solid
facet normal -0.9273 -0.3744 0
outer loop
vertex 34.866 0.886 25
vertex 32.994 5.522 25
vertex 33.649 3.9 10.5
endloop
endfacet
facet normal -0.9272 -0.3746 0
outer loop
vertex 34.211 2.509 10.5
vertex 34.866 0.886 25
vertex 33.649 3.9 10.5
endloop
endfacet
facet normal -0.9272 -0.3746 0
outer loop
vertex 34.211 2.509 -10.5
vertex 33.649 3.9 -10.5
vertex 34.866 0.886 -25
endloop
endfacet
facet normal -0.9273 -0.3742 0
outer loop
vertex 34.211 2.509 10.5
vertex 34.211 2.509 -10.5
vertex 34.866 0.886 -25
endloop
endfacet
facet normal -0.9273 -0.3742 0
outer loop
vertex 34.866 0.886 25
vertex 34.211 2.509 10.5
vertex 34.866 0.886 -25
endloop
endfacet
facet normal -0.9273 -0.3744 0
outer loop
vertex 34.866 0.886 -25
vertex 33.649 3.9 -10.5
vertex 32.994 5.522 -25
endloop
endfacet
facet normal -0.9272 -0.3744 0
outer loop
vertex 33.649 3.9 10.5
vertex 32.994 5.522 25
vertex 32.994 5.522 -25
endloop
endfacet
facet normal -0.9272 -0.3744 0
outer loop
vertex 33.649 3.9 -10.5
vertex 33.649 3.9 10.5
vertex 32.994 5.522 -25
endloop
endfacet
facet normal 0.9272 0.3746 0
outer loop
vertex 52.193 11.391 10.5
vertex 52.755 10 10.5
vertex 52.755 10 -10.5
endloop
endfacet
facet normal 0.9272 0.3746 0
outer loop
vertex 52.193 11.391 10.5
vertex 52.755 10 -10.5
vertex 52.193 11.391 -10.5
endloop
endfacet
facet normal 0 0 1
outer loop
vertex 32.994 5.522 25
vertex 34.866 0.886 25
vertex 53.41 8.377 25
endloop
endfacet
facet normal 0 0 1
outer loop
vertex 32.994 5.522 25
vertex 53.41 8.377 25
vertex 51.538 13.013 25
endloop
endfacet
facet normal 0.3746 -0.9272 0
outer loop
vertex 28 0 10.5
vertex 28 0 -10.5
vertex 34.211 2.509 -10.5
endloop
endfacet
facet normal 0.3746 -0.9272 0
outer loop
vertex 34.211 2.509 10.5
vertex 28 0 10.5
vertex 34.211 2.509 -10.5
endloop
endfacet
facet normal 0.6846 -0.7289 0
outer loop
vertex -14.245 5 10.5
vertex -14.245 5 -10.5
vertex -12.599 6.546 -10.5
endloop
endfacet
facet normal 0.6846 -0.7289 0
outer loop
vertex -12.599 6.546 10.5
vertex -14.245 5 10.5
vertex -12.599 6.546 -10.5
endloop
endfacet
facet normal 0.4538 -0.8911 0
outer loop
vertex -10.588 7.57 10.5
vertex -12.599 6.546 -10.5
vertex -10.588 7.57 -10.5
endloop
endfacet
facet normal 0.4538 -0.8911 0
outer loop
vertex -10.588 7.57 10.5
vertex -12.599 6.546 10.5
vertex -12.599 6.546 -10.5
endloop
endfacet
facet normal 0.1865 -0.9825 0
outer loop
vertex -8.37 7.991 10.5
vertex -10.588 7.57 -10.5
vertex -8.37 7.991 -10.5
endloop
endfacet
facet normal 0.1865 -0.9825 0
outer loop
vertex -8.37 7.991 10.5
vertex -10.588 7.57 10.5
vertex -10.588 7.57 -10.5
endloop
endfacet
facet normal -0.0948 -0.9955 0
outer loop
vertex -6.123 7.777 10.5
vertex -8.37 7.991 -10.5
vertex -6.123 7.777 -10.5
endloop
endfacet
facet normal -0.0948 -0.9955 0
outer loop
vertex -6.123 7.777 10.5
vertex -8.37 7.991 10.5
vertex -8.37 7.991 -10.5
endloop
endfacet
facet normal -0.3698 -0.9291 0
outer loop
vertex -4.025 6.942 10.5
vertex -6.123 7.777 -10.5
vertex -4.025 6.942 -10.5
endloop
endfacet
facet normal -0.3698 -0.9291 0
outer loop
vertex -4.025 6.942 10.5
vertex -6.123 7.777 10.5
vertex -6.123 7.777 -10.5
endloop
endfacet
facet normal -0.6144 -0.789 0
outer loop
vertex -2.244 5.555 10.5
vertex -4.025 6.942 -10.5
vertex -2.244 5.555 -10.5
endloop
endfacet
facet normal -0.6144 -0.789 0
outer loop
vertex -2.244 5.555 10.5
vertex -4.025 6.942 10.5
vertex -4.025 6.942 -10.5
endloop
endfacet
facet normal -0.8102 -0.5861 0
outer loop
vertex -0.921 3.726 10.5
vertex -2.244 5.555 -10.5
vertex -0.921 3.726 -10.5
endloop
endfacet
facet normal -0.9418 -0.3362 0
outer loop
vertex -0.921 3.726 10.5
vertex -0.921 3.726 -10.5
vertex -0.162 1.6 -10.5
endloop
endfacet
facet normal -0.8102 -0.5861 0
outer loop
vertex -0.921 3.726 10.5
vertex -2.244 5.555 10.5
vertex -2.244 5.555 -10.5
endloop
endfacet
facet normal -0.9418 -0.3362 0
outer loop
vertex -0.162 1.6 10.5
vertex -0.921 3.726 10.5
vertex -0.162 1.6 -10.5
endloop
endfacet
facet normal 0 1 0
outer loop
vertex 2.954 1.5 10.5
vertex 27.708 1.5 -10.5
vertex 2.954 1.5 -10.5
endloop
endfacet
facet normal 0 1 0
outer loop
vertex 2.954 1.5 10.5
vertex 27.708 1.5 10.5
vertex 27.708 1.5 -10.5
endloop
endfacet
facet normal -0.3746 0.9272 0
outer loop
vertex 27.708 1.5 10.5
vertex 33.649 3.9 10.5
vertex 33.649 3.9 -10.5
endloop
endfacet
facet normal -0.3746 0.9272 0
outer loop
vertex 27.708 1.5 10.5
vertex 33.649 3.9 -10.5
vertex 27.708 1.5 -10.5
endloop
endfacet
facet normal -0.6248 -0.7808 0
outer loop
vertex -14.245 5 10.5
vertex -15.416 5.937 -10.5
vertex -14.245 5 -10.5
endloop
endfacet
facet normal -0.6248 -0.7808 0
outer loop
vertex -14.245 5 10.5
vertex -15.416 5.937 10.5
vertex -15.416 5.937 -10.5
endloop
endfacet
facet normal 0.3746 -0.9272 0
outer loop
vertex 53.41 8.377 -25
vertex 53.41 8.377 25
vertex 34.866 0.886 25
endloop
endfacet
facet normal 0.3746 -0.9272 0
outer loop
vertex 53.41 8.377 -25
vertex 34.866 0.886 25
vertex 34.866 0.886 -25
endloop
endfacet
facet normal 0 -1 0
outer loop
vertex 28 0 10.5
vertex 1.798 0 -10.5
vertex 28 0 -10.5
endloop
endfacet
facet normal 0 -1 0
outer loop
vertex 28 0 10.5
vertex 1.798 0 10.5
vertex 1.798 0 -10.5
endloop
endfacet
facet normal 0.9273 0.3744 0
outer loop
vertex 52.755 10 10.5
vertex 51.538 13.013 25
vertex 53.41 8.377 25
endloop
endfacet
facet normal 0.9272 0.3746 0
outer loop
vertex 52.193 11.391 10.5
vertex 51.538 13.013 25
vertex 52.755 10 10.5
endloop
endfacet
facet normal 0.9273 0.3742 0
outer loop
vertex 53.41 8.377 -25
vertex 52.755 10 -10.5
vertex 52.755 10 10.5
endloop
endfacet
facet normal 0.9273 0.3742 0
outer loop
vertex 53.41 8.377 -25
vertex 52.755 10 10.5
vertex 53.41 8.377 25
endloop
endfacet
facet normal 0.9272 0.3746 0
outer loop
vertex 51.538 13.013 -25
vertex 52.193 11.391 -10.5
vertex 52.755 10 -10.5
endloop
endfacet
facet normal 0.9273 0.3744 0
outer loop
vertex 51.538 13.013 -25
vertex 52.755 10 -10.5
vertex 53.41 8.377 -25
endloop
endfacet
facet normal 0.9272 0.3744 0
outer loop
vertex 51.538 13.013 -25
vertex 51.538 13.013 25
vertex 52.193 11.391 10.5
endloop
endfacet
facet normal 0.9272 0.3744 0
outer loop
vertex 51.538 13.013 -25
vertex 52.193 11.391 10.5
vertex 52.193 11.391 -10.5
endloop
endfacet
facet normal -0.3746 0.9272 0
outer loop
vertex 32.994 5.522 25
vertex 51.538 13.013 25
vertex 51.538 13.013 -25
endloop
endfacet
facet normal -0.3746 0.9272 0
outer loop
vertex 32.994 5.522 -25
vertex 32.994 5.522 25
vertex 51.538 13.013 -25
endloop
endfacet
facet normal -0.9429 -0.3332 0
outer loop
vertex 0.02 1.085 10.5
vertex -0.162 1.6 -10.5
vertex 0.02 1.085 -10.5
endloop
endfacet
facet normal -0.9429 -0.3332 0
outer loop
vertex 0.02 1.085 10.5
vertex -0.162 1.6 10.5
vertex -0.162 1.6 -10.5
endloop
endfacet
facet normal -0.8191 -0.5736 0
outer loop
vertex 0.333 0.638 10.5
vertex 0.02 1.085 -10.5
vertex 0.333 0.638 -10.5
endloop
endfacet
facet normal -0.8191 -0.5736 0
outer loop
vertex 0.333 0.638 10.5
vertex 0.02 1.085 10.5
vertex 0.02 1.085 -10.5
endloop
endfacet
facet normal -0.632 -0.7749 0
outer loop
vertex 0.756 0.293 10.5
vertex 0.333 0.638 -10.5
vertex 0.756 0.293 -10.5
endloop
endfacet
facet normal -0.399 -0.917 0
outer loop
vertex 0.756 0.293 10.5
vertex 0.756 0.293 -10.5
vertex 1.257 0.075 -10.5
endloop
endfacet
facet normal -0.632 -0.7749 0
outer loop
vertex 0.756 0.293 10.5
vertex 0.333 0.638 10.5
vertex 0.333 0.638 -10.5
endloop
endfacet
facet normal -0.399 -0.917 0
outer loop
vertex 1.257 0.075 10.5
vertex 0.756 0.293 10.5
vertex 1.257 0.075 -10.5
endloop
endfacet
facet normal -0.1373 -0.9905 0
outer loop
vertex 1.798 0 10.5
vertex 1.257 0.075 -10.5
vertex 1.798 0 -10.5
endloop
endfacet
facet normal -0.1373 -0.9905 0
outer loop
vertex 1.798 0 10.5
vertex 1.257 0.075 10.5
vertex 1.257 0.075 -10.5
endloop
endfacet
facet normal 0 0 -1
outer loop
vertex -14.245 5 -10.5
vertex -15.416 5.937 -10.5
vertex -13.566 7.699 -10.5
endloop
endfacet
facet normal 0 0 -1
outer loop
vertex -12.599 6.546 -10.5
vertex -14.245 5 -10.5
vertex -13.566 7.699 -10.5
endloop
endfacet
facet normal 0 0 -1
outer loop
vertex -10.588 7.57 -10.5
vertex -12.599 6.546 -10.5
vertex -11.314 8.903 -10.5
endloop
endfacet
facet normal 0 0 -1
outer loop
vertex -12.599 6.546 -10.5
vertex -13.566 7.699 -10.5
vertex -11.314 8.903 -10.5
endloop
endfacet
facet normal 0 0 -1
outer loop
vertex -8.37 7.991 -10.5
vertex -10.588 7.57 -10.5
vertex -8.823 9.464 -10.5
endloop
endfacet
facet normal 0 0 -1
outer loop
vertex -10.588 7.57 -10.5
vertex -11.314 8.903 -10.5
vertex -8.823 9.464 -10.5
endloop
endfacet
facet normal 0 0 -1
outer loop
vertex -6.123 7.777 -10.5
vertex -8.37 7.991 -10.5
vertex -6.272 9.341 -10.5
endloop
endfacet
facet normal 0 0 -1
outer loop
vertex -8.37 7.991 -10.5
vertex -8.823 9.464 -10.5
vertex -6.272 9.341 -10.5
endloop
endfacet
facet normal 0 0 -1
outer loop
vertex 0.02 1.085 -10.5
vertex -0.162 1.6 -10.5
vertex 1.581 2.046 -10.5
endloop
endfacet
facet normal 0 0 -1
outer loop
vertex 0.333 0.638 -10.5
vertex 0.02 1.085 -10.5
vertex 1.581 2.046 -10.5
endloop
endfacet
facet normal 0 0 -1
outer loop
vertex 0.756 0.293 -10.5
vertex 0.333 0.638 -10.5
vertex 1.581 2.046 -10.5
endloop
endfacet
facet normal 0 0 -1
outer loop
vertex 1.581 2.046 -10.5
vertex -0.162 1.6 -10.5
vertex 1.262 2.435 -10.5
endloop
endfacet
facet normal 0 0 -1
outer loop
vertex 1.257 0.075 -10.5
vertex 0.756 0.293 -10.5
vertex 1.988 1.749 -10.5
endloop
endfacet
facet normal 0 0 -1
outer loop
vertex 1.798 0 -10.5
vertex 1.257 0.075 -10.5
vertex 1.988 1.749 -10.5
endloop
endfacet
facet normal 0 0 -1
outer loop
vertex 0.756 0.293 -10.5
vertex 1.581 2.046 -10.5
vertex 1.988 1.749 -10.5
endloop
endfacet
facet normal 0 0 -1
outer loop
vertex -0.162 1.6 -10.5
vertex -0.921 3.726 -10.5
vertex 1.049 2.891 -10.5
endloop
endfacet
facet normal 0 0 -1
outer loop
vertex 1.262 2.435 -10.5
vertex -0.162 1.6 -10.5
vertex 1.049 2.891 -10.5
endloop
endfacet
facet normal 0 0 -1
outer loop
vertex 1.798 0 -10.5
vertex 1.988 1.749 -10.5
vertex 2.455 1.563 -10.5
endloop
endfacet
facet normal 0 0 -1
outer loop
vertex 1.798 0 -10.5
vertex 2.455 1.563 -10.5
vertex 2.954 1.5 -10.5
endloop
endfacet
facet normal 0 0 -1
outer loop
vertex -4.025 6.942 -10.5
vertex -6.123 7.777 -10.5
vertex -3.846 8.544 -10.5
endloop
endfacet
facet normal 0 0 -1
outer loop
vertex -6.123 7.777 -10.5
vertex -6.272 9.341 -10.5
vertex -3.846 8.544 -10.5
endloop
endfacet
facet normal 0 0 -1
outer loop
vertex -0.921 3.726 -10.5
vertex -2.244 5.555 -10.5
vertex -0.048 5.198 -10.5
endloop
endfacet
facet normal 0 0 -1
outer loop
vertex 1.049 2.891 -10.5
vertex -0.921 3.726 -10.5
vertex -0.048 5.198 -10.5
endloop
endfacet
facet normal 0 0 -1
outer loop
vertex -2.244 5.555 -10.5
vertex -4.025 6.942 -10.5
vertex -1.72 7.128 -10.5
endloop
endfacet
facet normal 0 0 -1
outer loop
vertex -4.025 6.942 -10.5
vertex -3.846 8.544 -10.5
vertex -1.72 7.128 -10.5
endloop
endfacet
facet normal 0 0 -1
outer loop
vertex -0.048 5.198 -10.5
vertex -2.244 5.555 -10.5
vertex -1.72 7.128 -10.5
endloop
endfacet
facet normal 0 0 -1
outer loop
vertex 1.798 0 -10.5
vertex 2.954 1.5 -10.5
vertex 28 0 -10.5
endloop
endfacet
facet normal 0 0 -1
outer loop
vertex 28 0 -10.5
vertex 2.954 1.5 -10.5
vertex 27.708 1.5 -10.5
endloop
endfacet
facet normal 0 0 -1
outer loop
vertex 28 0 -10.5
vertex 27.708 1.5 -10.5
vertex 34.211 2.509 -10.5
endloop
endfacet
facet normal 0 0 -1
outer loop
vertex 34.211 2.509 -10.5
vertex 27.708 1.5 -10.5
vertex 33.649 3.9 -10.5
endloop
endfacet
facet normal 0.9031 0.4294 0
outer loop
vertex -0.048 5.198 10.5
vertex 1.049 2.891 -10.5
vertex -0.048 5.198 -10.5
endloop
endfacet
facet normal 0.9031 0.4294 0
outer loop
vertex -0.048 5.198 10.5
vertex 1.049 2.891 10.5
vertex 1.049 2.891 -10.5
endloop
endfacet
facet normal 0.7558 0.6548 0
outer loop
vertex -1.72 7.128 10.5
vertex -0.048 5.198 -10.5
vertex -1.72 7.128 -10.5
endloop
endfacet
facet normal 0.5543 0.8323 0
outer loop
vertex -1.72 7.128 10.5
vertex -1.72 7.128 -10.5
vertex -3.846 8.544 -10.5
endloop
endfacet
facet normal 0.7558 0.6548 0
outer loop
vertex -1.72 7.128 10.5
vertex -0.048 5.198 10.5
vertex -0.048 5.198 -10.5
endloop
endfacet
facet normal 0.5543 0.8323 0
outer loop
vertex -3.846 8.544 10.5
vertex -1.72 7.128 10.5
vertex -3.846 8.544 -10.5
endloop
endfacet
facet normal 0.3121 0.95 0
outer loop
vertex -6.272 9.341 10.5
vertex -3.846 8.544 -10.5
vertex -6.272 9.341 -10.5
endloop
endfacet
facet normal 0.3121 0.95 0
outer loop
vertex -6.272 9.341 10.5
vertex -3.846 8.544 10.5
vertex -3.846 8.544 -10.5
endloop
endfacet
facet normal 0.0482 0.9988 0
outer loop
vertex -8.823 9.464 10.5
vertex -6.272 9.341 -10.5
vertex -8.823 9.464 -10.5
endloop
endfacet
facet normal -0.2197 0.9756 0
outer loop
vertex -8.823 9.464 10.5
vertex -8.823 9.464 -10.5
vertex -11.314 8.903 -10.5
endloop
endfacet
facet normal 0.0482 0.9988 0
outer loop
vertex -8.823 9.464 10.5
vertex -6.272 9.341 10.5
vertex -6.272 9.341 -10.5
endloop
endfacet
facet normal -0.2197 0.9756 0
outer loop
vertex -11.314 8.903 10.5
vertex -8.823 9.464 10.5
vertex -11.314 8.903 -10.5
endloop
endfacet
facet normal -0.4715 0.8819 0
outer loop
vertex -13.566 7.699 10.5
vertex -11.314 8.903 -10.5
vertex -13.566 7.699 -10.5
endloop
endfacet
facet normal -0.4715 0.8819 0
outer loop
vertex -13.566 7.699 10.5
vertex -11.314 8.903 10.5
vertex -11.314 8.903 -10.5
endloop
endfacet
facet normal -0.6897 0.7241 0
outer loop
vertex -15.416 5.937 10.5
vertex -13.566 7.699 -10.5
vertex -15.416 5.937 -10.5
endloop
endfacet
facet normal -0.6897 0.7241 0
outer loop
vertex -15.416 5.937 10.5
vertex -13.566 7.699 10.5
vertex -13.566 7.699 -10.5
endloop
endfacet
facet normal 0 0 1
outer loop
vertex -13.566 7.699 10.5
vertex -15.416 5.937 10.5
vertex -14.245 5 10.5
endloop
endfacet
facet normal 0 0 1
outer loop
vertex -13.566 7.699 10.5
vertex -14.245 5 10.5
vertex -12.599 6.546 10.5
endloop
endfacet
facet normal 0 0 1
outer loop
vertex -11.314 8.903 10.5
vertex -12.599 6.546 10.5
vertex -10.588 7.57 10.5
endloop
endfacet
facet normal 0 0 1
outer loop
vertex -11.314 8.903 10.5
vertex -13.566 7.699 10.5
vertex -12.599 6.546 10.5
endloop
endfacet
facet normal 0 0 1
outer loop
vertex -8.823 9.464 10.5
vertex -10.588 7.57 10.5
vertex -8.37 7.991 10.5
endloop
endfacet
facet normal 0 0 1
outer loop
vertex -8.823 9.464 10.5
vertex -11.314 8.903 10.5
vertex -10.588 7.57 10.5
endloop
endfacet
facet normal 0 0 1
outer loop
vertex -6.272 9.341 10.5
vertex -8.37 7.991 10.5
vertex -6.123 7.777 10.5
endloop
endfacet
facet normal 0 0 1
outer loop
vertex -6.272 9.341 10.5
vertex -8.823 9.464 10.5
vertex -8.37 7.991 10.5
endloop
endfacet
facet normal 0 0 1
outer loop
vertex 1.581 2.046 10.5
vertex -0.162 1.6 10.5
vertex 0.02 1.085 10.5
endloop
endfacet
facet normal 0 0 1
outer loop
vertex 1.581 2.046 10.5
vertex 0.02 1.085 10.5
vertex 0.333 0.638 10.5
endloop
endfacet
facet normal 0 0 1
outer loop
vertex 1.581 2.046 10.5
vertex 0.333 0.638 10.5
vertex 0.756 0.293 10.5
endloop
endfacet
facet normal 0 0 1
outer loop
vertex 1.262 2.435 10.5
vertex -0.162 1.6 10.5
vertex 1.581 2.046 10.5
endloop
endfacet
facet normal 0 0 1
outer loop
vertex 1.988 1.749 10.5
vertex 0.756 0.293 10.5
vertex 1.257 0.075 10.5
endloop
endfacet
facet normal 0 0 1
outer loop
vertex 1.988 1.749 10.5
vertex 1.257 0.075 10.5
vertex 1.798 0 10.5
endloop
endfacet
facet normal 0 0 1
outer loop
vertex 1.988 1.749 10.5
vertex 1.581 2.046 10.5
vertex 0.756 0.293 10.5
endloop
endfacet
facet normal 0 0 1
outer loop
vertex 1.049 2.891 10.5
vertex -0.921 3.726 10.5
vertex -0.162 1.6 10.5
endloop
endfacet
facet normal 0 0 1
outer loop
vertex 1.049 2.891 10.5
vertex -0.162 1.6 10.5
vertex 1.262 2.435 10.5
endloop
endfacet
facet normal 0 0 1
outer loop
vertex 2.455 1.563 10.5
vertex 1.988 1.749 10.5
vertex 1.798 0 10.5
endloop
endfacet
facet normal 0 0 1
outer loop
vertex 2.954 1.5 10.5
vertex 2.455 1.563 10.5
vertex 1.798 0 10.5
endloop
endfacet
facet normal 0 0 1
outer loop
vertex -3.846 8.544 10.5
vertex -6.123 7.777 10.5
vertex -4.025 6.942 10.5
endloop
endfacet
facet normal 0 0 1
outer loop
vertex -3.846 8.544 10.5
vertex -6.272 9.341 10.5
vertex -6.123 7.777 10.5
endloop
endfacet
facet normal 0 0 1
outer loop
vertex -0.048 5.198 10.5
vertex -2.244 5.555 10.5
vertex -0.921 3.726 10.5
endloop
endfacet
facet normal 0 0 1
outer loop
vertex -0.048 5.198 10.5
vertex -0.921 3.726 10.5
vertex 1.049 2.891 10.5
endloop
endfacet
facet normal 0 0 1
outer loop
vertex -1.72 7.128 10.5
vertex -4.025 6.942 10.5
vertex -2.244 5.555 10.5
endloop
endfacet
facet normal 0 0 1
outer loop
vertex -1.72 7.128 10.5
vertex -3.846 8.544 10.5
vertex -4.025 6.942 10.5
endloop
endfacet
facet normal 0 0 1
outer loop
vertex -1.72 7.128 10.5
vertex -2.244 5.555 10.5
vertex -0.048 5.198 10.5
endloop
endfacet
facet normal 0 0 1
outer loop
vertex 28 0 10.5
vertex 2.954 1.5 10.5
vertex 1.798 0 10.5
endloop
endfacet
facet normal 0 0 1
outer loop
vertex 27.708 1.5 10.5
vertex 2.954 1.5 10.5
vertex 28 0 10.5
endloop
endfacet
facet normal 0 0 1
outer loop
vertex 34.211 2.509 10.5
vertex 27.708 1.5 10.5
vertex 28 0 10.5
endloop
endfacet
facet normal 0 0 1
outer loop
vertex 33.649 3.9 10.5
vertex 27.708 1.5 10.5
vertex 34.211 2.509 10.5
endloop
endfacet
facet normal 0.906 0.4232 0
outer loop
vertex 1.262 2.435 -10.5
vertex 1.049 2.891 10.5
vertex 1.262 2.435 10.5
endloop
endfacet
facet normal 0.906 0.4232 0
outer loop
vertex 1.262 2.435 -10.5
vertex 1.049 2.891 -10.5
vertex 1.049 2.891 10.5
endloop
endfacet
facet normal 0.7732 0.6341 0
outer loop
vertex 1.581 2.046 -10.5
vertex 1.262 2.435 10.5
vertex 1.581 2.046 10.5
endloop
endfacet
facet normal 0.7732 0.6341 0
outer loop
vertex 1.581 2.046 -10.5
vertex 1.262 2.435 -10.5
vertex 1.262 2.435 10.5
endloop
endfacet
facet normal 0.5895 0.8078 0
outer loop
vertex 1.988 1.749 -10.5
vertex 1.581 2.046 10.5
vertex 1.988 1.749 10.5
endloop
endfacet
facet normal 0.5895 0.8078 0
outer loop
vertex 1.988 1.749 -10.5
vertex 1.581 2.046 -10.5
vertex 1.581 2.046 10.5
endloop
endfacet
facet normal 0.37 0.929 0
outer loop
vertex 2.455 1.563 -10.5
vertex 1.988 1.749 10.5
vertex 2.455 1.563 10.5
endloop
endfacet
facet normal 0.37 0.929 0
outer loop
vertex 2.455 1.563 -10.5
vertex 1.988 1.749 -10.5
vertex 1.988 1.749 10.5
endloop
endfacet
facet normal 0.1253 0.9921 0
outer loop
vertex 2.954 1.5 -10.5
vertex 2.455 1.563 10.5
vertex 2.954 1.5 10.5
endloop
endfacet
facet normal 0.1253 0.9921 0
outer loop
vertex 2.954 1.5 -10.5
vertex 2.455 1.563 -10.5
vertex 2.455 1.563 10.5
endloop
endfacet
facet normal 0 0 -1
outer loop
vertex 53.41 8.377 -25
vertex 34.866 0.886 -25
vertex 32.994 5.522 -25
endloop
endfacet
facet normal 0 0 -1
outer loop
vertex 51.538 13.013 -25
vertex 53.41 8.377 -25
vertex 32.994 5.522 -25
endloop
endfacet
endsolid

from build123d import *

# Parameters (mm, degrees)
EXTRUDE_THIN1_DEPTH = 10.5
FILLET1_R           = 2
FILLET2_R           = 2
SKETCH3_W           = 50
SKETCH3_H           = 5
BOSS_EXTRUDE1_DEPTH = 20


with BuildPart() as part:
    # Sketch1 → Extrude-Thin1 (new body, symmetric)
    with BuildSketch(Plane.XY):
        with BuildLine():
            ThreePointArc((-14.244997998, 5), (-5.350470229, 7.548509256), (0, 0))
            Line((0, 0), (28, 0))
            Line((28, 0), (52.755002002, 10))
            Line((52.755002002, 10), (52.193172773, 11.390808368))
            Line((52.193172773, 11.390808368), (27.708474677, 1.5))
            Line((27.708474677, 1.5), (1.38083152, 1.5))
            ThreePointArc((1.38083152, 1.5), (-5.573468314, 9.184875828), (-15.415935123, 5.9375))
            Line((-15.415935123, 5.9375), (-14.244997998, 5))
        make_face()
    extrude(amount=EXTRUDE_THIN1_DEPTH, both=True)

    # Fillet1
    fillet1_edges = [part.edges().sort_by_distance(p)[0] for p in [
        (0, 0, 0),
    ]]
    fillet(fillet1_edges, radius=FILLET1_R)

    # Fillet2
    fillet2_edges = [part.edges().sort_by_distance(p)[0] for p in [
        (1.38083152, 1.5, 0),
    ]]
    fillet(fillet2_edges, radius=FILLET2_R)

    # Sketch3 → Boss-Extrude1 (add)
    with BuildSketch(Plane(origin=(48.826887199, 19.72404898, 0), x_dir=(0, 0, -1), z_dir=(0.927205579, 0.374552819, 0))):
        with Locations((0, -9.737478938)):
            Rectangle(SKETCH3_W, SKETCH3_H)
    extrude(amount=-BOSS_EXTRUDE1_DEPTH)


solid = part.part
